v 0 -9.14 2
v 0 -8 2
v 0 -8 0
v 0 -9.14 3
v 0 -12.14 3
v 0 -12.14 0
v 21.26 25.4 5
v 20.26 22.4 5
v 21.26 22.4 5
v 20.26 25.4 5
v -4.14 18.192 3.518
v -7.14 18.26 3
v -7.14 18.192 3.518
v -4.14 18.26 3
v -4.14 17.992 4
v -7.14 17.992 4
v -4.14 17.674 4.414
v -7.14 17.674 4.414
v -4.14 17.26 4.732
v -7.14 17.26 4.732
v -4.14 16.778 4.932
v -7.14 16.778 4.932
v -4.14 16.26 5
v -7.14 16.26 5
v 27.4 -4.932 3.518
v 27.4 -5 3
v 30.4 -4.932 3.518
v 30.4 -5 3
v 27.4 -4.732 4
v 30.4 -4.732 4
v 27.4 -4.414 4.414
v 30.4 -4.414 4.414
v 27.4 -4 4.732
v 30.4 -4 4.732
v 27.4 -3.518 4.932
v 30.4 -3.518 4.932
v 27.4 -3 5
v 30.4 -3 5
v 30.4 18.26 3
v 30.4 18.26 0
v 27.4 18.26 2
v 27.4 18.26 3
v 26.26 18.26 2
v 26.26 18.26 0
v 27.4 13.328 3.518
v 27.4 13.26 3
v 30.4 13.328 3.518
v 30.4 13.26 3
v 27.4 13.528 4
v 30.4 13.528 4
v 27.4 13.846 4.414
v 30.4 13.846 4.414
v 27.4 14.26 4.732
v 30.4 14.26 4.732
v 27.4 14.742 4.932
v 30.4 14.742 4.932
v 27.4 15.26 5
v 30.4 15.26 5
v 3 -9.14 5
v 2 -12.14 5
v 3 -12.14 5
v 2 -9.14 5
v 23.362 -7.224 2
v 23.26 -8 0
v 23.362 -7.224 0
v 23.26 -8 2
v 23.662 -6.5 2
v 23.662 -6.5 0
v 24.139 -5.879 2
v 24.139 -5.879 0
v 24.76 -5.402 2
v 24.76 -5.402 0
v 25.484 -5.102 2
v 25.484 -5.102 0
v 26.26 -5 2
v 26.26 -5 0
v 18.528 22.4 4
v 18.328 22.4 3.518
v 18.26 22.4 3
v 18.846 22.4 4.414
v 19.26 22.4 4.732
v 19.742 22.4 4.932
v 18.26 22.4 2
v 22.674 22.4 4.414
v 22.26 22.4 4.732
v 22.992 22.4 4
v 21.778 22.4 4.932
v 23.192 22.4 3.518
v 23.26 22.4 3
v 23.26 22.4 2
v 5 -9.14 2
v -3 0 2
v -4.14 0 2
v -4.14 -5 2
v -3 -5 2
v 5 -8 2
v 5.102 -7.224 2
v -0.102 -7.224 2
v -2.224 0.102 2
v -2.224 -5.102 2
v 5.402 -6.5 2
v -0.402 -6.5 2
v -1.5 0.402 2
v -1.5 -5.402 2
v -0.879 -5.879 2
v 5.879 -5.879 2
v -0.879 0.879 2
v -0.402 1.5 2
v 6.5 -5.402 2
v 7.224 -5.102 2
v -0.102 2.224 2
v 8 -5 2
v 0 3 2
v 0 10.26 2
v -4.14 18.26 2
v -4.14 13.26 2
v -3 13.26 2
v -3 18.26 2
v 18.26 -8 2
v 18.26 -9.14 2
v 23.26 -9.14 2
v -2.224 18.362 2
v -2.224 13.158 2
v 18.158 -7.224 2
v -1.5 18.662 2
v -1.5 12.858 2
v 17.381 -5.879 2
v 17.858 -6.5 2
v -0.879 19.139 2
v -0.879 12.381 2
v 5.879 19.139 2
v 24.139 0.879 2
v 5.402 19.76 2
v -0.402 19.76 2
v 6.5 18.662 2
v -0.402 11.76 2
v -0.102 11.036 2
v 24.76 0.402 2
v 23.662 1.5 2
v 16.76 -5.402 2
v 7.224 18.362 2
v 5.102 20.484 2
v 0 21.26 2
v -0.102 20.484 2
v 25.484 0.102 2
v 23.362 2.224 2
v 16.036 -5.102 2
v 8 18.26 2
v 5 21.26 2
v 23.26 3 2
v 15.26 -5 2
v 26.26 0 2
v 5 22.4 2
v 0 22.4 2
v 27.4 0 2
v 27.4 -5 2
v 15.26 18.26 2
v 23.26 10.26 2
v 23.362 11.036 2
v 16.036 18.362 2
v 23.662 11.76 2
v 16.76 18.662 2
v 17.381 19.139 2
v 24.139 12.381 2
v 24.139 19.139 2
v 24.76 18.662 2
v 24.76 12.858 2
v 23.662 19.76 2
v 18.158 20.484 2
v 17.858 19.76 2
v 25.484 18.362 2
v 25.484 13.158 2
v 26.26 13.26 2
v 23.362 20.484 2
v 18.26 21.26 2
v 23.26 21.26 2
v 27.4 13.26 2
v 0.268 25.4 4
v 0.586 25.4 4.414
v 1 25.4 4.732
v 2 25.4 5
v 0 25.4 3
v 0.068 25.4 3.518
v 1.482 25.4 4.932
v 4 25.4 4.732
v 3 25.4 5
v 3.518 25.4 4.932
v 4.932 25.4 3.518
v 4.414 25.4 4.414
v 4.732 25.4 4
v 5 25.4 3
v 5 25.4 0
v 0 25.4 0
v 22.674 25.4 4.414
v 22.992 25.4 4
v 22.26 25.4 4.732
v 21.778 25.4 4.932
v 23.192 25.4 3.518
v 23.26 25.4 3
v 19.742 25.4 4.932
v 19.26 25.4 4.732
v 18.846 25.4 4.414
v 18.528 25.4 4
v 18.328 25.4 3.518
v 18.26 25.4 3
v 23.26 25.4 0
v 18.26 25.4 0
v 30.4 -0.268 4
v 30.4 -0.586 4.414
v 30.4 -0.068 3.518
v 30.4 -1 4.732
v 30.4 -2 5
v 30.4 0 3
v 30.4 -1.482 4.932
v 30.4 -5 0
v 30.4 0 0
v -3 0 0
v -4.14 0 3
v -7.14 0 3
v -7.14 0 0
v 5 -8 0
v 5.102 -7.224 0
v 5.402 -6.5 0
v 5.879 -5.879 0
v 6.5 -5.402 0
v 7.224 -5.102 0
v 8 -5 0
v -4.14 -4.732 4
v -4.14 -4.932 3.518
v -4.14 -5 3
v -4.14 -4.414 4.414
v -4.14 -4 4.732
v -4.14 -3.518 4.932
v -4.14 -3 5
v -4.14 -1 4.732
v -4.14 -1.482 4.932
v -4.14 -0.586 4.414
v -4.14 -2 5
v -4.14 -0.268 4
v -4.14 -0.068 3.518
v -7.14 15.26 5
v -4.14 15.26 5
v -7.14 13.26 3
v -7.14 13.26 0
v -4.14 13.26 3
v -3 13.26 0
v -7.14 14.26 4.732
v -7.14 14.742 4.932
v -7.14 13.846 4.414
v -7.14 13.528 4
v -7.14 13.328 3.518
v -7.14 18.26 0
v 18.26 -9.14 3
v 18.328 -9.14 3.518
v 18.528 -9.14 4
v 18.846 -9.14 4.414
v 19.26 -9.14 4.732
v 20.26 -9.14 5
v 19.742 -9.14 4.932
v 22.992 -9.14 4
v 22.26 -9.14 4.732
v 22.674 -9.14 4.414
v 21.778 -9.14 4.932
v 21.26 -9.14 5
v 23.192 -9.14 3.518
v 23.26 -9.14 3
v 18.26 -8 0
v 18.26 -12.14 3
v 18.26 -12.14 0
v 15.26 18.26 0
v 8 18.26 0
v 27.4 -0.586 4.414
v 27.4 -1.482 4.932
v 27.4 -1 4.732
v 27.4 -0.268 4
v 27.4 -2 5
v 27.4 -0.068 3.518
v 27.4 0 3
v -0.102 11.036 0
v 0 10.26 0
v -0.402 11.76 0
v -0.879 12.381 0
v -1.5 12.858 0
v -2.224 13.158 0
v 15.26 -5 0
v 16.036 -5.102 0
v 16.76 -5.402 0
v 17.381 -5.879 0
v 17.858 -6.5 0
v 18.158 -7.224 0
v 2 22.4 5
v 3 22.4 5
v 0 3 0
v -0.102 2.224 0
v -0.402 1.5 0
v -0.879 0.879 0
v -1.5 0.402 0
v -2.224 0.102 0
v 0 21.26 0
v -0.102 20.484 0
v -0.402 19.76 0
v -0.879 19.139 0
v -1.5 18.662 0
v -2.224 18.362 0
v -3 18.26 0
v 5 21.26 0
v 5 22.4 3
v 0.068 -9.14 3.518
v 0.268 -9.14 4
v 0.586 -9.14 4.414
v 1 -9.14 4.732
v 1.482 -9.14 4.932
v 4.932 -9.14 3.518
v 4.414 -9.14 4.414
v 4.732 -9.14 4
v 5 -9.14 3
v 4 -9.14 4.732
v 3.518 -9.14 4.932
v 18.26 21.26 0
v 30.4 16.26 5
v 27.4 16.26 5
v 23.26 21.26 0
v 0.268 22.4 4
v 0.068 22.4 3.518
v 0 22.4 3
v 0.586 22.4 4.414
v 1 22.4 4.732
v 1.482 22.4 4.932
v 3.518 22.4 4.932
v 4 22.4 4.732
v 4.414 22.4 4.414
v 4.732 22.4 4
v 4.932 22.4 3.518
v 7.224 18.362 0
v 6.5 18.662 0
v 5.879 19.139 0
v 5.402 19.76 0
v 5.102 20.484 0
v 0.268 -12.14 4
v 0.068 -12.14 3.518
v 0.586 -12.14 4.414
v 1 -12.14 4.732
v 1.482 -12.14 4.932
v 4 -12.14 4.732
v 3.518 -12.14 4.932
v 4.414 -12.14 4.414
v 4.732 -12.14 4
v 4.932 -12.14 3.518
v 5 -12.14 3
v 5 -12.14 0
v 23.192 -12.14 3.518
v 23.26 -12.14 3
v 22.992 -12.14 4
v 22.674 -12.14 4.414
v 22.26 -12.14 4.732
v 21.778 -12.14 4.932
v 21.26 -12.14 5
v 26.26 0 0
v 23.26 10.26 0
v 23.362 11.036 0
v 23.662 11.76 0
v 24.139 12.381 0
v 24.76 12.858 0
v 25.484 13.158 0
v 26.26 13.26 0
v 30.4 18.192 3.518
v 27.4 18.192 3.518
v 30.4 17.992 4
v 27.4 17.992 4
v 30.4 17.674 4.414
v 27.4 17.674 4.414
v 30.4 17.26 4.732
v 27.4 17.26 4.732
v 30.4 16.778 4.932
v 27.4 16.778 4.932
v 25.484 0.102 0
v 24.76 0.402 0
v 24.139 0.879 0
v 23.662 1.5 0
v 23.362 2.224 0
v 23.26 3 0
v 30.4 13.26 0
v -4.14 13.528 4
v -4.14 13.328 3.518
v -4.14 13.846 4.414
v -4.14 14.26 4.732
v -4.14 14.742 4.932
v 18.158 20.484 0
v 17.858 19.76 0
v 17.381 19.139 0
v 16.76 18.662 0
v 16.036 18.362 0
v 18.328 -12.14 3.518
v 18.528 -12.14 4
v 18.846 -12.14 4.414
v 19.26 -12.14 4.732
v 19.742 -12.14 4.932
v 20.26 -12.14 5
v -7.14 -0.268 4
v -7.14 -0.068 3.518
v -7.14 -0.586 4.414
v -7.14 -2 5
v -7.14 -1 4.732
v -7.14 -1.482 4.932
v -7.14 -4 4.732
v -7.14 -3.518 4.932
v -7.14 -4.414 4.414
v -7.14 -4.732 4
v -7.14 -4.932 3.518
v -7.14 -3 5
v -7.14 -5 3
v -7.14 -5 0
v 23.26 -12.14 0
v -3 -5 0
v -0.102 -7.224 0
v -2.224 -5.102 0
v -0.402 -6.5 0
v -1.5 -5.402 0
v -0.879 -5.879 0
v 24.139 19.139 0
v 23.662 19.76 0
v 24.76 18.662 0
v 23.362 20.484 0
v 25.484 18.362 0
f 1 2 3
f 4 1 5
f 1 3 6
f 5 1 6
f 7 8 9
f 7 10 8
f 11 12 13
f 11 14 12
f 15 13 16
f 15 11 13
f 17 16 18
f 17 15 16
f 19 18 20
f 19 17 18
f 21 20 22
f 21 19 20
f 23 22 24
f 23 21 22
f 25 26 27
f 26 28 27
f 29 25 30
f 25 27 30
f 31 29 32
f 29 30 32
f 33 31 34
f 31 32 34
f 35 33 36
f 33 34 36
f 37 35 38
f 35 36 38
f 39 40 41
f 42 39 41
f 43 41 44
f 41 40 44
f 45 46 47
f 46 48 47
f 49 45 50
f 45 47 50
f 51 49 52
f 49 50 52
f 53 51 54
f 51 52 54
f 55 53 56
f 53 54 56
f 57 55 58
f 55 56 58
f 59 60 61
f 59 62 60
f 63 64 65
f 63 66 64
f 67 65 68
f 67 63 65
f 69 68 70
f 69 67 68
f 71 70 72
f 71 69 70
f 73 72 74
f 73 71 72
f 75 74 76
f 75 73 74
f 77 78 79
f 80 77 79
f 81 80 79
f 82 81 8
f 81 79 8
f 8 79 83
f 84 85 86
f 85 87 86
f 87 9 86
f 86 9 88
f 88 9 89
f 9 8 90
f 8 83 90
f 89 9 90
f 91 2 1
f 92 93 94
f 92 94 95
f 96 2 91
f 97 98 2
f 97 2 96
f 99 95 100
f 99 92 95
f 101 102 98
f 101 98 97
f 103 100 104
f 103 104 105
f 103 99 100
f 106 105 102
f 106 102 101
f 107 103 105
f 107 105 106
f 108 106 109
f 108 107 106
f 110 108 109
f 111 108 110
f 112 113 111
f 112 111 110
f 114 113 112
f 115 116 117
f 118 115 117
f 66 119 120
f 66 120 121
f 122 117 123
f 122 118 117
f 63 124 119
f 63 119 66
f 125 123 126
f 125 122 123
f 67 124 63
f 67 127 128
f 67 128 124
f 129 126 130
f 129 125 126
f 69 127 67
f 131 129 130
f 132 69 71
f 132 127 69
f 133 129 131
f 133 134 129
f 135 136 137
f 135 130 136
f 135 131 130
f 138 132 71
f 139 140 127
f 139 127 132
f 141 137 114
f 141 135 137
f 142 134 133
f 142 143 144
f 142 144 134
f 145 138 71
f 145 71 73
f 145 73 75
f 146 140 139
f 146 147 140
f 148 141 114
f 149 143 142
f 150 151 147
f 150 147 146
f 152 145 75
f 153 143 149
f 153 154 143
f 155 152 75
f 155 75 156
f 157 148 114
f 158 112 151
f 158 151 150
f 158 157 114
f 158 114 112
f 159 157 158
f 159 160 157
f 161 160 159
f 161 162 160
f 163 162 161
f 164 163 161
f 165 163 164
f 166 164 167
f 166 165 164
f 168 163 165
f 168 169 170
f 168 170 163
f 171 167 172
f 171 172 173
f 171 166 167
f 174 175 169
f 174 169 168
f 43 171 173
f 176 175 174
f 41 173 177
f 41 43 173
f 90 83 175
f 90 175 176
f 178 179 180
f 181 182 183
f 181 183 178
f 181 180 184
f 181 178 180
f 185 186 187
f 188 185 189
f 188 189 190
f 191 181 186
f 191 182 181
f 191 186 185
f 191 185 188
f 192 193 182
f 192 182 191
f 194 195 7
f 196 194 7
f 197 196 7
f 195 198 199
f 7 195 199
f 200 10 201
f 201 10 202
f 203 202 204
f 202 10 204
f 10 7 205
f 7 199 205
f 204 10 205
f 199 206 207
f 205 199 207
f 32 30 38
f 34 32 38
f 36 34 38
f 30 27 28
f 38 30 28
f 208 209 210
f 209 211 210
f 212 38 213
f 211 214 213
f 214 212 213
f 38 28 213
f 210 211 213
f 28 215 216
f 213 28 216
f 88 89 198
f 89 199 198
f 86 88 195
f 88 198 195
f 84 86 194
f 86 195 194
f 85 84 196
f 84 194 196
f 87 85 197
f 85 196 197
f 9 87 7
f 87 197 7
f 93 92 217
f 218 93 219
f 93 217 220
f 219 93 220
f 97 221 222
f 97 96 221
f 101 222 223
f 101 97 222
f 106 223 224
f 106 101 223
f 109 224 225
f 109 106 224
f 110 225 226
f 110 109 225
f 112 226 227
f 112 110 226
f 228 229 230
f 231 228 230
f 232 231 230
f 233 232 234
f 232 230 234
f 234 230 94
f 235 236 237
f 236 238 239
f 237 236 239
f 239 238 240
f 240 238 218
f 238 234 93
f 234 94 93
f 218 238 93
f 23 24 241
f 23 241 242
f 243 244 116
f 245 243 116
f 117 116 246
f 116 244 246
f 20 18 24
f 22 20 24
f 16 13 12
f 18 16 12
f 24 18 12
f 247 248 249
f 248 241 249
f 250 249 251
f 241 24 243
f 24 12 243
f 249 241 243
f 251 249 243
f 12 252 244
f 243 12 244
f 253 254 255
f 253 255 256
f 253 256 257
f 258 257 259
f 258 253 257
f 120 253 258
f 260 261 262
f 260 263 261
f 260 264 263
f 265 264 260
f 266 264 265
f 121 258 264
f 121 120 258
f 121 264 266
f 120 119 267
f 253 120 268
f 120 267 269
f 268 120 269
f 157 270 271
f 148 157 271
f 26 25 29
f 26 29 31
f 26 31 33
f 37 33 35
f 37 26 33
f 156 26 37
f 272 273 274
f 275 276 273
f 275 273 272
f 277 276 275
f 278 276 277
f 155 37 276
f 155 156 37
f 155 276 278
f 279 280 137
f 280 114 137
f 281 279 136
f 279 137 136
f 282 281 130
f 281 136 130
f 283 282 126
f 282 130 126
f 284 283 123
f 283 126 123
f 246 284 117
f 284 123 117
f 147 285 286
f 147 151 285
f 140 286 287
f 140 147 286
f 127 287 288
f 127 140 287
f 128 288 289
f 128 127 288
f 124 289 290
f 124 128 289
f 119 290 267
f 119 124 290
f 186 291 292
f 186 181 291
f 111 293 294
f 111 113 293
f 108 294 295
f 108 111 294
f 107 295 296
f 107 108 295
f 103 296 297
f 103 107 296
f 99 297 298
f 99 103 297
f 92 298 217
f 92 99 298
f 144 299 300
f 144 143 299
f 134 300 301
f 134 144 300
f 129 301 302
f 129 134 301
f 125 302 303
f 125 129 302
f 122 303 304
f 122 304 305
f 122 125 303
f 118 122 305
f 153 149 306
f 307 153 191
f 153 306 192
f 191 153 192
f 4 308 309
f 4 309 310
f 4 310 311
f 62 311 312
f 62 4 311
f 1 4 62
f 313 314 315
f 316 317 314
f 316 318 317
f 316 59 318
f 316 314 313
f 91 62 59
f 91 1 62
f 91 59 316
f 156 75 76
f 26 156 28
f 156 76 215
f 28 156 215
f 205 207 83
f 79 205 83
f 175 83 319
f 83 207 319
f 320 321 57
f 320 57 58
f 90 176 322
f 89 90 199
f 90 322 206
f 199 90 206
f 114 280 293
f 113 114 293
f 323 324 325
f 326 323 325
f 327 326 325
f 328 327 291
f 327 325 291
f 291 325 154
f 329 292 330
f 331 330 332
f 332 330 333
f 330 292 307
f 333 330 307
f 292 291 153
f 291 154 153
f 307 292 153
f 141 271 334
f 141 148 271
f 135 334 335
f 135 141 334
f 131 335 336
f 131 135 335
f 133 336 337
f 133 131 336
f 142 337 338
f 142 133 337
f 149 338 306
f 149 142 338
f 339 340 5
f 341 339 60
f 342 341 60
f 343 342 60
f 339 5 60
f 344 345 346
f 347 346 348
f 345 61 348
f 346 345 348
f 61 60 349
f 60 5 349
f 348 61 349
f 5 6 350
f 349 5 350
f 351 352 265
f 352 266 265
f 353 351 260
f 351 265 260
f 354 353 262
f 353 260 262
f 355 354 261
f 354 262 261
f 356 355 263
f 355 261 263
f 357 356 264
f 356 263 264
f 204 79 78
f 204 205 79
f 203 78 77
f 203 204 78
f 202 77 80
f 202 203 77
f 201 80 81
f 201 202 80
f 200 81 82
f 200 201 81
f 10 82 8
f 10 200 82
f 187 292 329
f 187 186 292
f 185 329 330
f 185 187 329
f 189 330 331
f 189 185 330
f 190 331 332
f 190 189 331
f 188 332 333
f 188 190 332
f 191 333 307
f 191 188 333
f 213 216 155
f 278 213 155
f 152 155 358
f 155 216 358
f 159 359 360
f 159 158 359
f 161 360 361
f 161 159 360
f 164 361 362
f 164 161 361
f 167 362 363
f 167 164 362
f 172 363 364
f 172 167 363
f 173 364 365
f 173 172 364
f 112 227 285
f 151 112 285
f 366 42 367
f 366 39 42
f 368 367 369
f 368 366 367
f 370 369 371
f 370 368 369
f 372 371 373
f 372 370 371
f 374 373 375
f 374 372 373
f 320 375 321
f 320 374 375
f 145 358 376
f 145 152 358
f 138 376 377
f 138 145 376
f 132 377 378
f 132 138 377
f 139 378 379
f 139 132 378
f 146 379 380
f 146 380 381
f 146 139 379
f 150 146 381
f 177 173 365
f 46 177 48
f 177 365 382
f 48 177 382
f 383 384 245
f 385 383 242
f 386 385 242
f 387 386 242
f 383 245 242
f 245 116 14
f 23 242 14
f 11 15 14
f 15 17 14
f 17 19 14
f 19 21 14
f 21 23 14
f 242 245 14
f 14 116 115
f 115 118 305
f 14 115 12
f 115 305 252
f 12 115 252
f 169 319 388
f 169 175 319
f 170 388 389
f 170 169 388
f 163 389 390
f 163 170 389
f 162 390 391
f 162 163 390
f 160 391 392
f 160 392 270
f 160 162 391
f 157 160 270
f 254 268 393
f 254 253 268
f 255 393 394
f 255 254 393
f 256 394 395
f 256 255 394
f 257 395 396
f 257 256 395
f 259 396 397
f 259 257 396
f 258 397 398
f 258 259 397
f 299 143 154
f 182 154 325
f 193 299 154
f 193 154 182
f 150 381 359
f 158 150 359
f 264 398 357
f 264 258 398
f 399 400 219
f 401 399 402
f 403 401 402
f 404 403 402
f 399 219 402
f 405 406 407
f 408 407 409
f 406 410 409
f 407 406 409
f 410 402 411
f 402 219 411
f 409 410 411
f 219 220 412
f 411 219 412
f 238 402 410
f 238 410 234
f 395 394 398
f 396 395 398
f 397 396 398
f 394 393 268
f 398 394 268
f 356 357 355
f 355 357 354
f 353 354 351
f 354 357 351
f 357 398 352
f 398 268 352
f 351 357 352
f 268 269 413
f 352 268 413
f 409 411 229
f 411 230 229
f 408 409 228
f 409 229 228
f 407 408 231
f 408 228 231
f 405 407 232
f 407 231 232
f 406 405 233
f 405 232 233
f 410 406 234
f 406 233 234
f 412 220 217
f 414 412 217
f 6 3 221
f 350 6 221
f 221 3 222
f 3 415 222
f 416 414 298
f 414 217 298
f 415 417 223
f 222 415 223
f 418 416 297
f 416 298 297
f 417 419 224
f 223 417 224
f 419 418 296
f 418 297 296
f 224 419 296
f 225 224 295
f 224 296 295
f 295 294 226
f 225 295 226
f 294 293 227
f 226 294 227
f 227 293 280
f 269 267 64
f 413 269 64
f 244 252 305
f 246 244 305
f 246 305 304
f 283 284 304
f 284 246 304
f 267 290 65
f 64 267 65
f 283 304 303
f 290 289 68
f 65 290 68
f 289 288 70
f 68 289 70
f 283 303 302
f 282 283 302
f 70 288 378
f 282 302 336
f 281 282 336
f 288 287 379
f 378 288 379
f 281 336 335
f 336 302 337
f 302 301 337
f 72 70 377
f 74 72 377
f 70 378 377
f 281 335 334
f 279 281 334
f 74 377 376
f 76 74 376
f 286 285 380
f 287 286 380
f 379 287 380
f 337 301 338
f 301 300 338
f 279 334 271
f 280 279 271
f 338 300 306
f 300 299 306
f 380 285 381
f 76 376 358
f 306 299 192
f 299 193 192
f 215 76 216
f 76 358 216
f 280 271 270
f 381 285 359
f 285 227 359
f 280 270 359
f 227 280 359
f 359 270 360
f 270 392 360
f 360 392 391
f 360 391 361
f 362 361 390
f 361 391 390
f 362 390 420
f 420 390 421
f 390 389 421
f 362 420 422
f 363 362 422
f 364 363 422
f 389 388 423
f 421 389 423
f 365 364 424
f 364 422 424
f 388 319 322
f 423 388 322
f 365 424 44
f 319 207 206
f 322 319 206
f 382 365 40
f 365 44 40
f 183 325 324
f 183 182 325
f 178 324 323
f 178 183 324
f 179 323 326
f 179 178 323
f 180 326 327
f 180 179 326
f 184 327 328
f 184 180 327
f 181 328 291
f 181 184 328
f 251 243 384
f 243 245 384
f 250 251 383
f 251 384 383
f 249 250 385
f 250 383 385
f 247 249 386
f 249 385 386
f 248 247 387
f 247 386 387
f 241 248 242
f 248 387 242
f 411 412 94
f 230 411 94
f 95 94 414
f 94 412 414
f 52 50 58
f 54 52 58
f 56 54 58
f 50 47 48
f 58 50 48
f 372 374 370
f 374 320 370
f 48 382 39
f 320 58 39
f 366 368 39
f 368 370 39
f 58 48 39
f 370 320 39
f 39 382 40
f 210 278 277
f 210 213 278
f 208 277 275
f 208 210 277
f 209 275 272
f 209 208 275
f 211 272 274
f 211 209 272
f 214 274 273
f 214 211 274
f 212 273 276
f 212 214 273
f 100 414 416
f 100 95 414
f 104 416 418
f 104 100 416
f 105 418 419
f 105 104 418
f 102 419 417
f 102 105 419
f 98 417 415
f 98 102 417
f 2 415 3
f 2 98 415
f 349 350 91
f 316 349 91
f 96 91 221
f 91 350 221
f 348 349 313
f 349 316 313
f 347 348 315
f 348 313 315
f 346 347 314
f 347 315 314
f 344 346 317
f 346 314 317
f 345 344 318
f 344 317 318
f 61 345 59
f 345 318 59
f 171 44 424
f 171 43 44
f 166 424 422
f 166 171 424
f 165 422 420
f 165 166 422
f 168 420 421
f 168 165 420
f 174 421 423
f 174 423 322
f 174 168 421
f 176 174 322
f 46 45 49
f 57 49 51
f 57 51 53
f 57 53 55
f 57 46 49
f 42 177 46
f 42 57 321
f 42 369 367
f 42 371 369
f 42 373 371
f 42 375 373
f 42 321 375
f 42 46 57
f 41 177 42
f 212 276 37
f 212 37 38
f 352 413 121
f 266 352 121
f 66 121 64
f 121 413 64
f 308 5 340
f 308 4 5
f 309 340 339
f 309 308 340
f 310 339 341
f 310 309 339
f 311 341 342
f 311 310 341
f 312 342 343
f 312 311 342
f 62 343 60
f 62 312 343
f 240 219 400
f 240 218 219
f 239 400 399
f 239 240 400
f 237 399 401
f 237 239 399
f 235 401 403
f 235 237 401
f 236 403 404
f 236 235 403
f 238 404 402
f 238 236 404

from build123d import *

# Parameters (mm, degrees)
F1_DEPTH = 2
F2_W     = 5
F2_H     = 3
F2_W_2   = 3
F2_H_2   = 5
F3_DEPTH = 3
F4_R     = 3
F5_R     = 2


with BuildPart() as f1:
    # F0 (on Top) → F1 (new body)
    with BuildSketch(Plane.XY):
        Polygon((0, 13.26), (0, 0), (-7.14, 0), (-7.14, -5), (0, -5), (0, -12.14), (5, -12.14), (5, -5), (18.26, -5), (18.26, -12.14), (23.26, -12.14), (23.26, -5), (30.4, -5), (30.4, 0), (23.26, 0), (23.26, 13.26), (30.4, 13.26), (30.4, 18.26), (23.26, 18.26), (23.26, 25.4), (18.26, 25.4), (18.26, 18.26), (5, 18.26), (5, 25.4), (0, 25.4), (0, 18.26), (-7.14, 18.26), (-7.14, 13.26), align=None)
    extrude(amount=F1_DEPTH)

    # F2 (on face) → F3 (join)
    with BuildSketch(Plane.XY.offset(2)):
        with Locations((2.5, 23.9)):
            Rectangle(F2_W, F2_H)
        with Locations((20.76, 23.9)):
            Rectangle(F2_W, F2_H)
        with Locations((-5.64, 15.76)):
            Rectangle(F2_W_2, F2_H_2)
        with Locations((28.9, 15.76)):
            Rectangle(F2_W_2, F2_H_2)
        with Locations((28.9, -2.5)):
            Rectangle(F2_W_2, F2_H_2)
        with Locations((20.76, -10.64)):
            Rectangle(F2_W, F2_H)
        with Locations((2.5, -10.64)):
            Rectangle(F2_W, F2_H)
        with Locations((-5.64, -2.5)):
            Rectangle(F2_W_2, F2_H_2)
    extrude(amount=F3_DEPTH)

    # F4
    f4_edges = [f1.edges().sort_by_distance(p)[0] for p in [
        (18.26, 18.26, 1),
        (5, 18.26, 1),
        (0, 18.26, 1),
        (0, 13.26, 1),
        (0, 0, 1),
        (0, -5, 1),
        (5, -5, 1),
        (18.26, -5, 1),
        (23.26, -5, 1),
        (23.26, 13.26, 1),
        (23.26, 0, 1),
        (23.26, 18.26, 1),
    ]]
    fillet(f4_edges, radius=F4_R)

    # F5
    f5_edges = [f1.edges().sort_by_distance(p)[0] for p in [
        (-5.64, -5, 5),
        (-5.64, 0, 5),
        (-5.64, 13.26, 5),
        (-5.64, 18.26, 5),
        (0, 23.9, 5),
        (5, 23.9, 5),
        (18.26, 23.9, 5),
        (23.26, 23.9, 5),
        (28.9, 13.26, 5),
        (28.9, 18.26, 5),
        (28.9, -5, 5),
        (28.9, 0, 5),
        (23.26, -10.64, 5),
        (18.26, -10.64, 5),
        (5, -10.64, 5),
        (0, -10.64, 5),
    ]]
    fillet(f5_edges, radius=F5_R)


solid = f1.part
